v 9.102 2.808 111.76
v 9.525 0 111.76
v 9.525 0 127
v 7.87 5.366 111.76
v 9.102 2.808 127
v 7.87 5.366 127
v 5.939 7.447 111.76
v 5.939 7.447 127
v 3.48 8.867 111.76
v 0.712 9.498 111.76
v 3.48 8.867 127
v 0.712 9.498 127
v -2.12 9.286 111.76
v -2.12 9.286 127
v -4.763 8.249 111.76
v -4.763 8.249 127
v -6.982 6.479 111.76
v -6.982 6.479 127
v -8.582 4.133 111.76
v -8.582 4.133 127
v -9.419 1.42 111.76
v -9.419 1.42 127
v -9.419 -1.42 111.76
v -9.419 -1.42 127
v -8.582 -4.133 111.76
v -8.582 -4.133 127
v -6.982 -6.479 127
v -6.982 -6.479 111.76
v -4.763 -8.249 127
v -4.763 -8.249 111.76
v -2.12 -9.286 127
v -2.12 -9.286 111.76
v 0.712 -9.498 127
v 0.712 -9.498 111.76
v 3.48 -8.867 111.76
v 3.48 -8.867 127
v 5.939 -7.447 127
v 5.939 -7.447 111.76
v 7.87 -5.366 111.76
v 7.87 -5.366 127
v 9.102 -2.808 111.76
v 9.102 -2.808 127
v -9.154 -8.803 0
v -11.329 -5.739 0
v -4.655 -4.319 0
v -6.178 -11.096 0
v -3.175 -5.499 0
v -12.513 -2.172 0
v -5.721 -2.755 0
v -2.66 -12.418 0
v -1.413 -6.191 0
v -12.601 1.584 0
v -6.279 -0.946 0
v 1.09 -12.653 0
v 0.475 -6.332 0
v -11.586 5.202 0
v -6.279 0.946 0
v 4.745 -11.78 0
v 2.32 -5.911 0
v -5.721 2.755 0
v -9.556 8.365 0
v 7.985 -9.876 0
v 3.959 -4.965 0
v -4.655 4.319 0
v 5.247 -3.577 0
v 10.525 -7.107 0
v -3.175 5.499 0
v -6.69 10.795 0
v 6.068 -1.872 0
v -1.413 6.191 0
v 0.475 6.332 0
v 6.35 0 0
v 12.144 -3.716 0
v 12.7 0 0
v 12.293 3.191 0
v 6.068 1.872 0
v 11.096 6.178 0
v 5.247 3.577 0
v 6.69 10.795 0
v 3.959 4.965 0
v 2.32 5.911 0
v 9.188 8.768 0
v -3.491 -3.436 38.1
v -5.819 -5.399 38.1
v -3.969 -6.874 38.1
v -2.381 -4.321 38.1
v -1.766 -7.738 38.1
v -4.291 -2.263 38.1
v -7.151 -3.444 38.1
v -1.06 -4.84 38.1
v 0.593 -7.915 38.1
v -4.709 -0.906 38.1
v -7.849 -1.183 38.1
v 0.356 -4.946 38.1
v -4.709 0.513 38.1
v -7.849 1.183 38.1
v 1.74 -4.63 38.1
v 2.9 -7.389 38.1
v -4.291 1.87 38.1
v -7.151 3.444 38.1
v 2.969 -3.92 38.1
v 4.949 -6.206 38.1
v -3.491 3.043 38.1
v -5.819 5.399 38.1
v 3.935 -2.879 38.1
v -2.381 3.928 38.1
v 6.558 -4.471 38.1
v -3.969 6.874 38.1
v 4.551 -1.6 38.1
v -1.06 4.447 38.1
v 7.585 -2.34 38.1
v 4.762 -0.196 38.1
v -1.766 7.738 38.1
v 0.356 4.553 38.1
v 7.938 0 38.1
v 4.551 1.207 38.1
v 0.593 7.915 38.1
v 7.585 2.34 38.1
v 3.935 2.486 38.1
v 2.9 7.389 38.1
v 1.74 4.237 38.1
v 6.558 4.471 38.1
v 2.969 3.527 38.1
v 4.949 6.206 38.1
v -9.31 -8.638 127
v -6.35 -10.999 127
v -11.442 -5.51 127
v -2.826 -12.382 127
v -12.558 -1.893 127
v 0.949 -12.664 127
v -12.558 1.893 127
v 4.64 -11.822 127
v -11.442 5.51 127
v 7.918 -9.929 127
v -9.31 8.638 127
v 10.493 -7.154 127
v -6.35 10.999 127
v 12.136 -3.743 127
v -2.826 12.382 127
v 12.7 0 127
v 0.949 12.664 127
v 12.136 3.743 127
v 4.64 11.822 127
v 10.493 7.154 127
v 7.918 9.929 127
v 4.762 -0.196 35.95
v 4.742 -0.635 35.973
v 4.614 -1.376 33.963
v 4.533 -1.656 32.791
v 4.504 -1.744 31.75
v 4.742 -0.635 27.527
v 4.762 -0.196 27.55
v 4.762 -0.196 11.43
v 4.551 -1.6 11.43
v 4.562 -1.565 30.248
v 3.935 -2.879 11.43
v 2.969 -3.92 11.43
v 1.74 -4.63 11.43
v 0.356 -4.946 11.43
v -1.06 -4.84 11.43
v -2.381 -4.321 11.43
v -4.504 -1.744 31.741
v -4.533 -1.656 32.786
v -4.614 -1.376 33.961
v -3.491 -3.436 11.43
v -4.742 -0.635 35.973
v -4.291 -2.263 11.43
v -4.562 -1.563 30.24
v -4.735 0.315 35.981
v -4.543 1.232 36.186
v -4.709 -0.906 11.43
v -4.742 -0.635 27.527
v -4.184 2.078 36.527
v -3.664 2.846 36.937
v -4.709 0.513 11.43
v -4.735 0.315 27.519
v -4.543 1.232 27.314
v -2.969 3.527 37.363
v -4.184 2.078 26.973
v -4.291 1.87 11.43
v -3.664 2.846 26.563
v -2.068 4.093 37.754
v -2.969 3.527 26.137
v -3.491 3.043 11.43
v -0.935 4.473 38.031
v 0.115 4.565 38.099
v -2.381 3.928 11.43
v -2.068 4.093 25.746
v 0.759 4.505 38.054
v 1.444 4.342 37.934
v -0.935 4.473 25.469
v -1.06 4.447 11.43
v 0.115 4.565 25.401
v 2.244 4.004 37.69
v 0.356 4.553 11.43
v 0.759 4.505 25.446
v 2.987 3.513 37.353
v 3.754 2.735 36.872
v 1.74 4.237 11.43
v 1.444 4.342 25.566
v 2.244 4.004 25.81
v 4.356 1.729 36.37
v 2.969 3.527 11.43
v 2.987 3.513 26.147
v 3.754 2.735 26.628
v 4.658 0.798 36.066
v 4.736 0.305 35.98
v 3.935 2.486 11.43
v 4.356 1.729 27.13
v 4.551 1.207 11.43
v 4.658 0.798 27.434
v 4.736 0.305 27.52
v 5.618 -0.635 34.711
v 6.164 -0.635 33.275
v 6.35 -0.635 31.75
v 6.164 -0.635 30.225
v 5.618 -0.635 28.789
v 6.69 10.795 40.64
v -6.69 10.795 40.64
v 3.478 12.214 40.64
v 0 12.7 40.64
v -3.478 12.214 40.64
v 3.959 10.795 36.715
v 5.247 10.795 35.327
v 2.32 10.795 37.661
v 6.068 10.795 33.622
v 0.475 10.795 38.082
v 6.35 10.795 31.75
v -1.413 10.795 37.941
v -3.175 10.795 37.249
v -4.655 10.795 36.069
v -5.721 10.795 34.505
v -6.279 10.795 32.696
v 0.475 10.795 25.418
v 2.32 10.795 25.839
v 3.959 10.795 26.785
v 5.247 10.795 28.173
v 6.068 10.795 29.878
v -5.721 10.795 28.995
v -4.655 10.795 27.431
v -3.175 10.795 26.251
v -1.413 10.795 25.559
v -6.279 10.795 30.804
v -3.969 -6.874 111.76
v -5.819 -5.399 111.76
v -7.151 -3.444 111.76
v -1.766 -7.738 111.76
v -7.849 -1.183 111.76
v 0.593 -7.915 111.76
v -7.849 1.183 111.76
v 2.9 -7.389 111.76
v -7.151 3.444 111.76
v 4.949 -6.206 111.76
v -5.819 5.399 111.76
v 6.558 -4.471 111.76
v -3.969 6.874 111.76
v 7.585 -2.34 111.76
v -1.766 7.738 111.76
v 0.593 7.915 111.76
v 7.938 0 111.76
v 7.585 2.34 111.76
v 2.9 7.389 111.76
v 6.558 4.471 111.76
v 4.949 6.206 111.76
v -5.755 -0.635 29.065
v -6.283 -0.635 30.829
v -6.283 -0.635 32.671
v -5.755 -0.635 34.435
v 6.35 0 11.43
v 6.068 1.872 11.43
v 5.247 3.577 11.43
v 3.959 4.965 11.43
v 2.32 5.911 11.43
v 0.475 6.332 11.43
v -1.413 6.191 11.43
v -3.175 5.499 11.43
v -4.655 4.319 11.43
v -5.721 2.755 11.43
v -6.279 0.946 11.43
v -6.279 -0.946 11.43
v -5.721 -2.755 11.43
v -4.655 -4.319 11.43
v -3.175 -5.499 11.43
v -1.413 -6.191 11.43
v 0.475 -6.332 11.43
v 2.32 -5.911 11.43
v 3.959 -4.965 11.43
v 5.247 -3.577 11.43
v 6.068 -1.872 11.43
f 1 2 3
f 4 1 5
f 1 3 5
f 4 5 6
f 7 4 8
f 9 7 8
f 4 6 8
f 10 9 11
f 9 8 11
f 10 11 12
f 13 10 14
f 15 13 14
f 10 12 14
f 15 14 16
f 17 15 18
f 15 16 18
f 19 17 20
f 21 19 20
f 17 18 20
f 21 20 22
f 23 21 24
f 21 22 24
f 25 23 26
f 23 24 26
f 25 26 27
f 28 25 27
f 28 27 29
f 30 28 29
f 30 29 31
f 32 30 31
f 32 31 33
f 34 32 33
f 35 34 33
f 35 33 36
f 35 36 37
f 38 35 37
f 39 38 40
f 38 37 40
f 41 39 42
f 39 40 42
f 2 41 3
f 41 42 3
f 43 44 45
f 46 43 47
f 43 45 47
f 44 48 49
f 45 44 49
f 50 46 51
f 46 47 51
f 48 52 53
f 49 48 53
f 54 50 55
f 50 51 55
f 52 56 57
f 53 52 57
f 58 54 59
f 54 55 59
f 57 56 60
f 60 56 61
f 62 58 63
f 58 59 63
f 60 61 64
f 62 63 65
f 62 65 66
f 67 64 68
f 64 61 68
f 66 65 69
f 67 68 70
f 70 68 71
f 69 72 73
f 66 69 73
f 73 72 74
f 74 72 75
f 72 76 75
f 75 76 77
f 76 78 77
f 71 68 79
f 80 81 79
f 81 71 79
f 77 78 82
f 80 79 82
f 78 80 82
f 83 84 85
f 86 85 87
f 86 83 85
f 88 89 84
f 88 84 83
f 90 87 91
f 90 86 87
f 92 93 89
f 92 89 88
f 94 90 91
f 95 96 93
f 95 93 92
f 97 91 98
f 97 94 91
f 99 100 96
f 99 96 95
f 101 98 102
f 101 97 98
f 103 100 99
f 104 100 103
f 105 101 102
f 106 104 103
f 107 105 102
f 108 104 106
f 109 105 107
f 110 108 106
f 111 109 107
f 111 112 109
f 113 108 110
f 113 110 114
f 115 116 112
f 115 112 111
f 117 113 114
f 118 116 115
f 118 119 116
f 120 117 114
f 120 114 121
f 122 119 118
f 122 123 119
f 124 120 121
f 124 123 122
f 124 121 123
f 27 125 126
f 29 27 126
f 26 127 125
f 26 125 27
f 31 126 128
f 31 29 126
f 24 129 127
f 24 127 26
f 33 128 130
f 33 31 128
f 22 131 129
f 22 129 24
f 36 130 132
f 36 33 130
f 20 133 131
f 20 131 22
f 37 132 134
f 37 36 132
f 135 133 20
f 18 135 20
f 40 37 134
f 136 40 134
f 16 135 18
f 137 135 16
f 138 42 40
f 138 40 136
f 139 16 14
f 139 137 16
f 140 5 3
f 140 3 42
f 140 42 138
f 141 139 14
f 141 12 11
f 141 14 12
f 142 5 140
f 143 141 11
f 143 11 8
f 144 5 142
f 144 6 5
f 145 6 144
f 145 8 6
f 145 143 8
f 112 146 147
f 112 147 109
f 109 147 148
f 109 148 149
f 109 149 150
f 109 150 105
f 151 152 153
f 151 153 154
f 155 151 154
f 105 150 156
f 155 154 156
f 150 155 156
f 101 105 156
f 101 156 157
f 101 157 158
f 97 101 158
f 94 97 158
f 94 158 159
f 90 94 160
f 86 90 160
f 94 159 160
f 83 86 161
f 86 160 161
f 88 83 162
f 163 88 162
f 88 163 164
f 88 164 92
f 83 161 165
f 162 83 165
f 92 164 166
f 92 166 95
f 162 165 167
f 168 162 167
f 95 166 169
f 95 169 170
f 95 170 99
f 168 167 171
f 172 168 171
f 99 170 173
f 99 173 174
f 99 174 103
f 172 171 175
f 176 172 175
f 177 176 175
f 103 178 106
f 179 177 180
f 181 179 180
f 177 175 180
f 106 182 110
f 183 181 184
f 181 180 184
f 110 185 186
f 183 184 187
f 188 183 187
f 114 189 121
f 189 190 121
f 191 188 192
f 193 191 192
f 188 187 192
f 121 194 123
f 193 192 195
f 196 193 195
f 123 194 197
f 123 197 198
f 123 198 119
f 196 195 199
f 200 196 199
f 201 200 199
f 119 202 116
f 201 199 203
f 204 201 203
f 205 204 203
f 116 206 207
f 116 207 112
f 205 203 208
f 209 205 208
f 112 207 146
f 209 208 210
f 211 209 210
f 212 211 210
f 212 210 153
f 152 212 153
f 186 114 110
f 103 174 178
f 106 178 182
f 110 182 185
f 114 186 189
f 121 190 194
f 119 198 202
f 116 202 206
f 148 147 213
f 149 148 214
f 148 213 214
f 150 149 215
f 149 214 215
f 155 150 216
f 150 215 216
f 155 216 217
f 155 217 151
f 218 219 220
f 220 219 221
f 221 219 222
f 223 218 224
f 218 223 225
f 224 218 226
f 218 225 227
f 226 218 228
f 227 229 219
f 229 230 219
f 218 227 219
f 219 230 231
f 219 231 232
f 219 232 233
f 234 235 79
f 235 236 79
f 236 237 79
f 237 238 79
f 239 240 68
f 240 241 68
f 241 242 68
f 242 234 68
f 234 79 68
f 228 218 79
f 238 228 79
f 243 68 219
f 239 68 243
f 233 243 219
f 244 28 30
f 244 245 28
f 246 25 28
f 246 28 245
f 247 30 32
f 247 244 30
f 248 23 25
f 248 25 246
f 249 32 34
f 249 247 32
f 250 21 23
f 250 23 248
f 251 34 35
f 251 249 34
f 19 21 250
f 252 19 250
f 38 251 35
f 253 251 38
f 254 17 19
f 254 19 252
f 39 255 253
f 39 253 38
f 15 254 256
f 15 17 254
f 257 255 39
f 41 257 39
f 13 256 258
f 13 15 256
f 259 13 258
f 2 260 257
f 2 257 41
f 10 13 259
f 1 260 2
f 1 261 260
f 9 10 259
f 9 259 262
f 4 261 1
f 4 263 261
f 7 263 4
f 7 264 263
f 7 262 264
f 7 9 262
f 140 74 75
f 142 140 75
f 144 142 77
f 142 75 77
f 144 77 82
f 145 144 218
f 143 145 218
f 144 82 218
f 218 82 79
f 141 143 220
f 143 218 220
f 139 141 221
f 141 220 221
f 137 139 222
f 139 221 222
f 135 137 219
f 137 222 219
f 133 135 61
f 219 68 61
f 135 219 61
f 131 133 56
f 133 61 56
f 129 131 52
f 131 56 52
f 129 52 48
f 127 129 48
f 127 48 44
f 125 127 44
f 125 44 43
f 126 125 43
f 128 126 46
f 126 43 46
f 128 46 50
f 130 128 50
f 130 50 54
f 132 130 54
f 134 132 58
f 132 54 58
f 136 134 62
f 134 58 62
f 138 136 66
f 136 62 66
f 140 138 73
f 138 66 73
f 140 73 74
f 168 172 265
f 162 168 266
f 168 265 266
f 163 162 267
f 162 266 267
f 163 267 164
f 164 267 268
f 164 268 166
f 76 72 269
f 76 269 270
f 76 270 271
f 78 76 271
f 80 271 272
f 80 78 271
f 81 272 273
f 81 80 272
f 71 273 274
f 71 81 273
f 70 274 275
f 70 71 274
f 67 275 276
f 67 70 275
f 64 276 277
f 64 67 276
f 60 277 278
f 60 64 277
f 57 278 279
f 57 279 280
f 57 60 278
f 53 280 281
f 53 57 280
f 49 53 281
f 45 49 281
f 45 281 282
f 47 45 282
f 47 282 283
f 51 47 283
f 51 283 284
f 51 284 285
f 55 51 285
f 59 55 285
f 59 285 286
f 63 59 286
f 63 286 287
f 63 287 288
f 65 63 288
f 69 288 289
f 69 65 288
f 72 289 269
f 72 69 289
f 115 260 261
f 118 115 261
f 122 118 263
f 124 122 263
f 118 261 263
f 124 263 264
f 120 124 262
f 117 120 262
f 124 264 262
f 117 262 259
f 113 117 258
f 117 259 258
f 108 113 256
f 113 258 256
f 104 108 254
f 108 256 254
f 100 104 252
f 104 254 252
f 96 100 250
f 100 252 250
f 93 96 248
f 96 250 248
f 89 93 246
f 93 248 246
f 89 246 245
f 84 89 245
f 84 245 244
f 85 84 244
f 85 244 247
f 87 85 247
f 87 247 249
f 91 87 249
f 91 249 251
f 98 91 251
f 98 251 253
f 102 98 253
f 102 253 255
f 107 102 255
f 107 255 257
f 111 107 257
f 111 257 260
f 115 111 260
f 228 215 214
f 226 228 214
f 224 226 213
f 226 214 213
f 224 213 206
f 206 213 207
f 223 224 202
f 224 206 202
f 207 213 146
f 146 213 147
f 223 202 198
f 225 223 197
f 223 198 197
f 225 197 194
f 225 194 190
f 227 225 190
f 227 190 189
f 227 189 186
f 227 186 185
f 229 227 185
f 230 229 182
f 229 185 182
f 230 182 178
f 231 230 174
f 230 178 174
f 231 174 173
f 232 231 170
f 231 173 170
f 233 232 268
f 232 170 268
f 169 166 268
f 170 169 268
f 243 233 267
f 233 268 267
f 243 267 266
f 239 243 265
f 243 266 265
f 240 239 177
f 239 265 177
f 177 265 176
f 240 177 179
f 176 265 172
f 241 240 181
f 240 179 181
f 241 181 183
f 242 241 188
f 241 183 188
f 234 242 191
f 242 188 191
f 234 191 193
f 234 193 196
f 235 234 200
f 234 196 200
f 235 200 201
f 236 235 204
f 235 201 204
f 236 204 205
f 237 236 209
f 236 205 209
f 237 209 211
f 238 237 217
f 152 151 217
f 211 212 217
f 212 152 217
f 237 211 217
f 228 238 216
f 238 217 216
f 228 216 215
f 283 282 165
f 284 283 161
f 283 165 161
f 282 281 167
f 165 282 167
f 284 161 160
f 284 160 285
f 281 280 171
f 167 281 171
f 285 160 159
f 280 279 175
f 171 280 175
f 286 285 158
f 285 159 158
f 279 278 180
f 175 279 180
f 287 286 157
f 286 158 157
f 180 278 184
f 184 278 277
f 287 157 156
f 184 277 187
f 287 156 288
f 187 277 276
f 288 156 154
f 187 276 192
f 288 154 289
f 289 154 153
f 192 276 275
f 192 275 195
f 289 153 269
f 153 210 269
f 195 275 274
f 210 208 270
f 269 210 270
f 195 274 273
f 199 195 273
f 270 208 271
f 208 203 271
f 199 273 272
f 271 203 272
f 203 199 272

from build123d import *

# Parameters (mm, degrees)
F0_R      = 12.7
F1_DEPTH  = 127
F2_R      = 7.9375
F3_DEPTH  = 88.899746
F6_DEPTH  = 40.64
F8_R      = 9.525
F9_DEPTH  = 15.24
F10_D     = 12.7
F10_DEPTH = 11.43
F10_TIP   = 3.8154649308
F4_R      = 4.7625
F11_DEPTH = 50.8
F12_R     = 6.35
F13_DEPTH = 11.43


with BuildPart() as f1:
    # F0 (on Top) → F1 (new body)
    with BuildSketch(Plane.XY):
        Circle(F0_R)
    extrude(amount=F1_DEPTH)

    # F2 (on face) → F3 (cut)
    with BuildSketch(Plane.XY.offset(127)):
        Circle(F2_R)
    extrude(amount=-F3_DEPTH, mode=Mode.SUBTRACT)

    # F5 (on face) → F6 (cut)
    with BuildSketch(Plane(origin=(0, 0, 0), x_dir=(1, 0, 0), z_dir=(0, 0, -1))):
        with BuildLine():
            Line((6.6901401331, -10.795), (-6.6901401331, -10.795))
            ThreePointArc((-6.6901401331, -10.795), (0, -12.7), (6.6901401331, -10.795))
        make_face()
    extrude(amount=-F6_DEPTH, mode=Mode.SUBTRACT)

    # F8 (on face) → F9 (cut)
    with BuildSketch(Plane.XY.offset(127)):
        Circle(F8_R)
    extrude(amount=-F9_DEPTH, mode=Mode.SUBTRACT)

    # F10
    with Locations(Plane(origin=(0, 10.795, 0), x_dir=(-1, 0, 0), z_dir=(0, 1, 0))):
        with Locations((0, 31.75)):
            Hole(F10_D / 2, depth=F10_DEPTH)
            with Locations((0, 0, -(F10_DEPTH + F10_TIP / 2))):  # 118° drill point
                Cone(0, F10_D / 2, F10_TIP, mode=Mode.SUBTRACT)

    # F4 (on face) → F11 (cut)
    with BuildSketch(Plane(origin=(0, 0, 0), x_dir=(1, 0, 0), z_dir=(0, 0, -1))):
        with Locations((0, 0.1964742664)):
            Circle(F4_R)
    extrude(amount=-F11_DEPTH, mode=Mode.SUBTRACT)

    # F12 (on Top) → F13 (cut)
    with BuildSketch(Plane.XY):
        Circle(F12_R)
    extrude(amount=F13_DEPTH, mode=Mode.SUBTRACT)


solid = f1.part
